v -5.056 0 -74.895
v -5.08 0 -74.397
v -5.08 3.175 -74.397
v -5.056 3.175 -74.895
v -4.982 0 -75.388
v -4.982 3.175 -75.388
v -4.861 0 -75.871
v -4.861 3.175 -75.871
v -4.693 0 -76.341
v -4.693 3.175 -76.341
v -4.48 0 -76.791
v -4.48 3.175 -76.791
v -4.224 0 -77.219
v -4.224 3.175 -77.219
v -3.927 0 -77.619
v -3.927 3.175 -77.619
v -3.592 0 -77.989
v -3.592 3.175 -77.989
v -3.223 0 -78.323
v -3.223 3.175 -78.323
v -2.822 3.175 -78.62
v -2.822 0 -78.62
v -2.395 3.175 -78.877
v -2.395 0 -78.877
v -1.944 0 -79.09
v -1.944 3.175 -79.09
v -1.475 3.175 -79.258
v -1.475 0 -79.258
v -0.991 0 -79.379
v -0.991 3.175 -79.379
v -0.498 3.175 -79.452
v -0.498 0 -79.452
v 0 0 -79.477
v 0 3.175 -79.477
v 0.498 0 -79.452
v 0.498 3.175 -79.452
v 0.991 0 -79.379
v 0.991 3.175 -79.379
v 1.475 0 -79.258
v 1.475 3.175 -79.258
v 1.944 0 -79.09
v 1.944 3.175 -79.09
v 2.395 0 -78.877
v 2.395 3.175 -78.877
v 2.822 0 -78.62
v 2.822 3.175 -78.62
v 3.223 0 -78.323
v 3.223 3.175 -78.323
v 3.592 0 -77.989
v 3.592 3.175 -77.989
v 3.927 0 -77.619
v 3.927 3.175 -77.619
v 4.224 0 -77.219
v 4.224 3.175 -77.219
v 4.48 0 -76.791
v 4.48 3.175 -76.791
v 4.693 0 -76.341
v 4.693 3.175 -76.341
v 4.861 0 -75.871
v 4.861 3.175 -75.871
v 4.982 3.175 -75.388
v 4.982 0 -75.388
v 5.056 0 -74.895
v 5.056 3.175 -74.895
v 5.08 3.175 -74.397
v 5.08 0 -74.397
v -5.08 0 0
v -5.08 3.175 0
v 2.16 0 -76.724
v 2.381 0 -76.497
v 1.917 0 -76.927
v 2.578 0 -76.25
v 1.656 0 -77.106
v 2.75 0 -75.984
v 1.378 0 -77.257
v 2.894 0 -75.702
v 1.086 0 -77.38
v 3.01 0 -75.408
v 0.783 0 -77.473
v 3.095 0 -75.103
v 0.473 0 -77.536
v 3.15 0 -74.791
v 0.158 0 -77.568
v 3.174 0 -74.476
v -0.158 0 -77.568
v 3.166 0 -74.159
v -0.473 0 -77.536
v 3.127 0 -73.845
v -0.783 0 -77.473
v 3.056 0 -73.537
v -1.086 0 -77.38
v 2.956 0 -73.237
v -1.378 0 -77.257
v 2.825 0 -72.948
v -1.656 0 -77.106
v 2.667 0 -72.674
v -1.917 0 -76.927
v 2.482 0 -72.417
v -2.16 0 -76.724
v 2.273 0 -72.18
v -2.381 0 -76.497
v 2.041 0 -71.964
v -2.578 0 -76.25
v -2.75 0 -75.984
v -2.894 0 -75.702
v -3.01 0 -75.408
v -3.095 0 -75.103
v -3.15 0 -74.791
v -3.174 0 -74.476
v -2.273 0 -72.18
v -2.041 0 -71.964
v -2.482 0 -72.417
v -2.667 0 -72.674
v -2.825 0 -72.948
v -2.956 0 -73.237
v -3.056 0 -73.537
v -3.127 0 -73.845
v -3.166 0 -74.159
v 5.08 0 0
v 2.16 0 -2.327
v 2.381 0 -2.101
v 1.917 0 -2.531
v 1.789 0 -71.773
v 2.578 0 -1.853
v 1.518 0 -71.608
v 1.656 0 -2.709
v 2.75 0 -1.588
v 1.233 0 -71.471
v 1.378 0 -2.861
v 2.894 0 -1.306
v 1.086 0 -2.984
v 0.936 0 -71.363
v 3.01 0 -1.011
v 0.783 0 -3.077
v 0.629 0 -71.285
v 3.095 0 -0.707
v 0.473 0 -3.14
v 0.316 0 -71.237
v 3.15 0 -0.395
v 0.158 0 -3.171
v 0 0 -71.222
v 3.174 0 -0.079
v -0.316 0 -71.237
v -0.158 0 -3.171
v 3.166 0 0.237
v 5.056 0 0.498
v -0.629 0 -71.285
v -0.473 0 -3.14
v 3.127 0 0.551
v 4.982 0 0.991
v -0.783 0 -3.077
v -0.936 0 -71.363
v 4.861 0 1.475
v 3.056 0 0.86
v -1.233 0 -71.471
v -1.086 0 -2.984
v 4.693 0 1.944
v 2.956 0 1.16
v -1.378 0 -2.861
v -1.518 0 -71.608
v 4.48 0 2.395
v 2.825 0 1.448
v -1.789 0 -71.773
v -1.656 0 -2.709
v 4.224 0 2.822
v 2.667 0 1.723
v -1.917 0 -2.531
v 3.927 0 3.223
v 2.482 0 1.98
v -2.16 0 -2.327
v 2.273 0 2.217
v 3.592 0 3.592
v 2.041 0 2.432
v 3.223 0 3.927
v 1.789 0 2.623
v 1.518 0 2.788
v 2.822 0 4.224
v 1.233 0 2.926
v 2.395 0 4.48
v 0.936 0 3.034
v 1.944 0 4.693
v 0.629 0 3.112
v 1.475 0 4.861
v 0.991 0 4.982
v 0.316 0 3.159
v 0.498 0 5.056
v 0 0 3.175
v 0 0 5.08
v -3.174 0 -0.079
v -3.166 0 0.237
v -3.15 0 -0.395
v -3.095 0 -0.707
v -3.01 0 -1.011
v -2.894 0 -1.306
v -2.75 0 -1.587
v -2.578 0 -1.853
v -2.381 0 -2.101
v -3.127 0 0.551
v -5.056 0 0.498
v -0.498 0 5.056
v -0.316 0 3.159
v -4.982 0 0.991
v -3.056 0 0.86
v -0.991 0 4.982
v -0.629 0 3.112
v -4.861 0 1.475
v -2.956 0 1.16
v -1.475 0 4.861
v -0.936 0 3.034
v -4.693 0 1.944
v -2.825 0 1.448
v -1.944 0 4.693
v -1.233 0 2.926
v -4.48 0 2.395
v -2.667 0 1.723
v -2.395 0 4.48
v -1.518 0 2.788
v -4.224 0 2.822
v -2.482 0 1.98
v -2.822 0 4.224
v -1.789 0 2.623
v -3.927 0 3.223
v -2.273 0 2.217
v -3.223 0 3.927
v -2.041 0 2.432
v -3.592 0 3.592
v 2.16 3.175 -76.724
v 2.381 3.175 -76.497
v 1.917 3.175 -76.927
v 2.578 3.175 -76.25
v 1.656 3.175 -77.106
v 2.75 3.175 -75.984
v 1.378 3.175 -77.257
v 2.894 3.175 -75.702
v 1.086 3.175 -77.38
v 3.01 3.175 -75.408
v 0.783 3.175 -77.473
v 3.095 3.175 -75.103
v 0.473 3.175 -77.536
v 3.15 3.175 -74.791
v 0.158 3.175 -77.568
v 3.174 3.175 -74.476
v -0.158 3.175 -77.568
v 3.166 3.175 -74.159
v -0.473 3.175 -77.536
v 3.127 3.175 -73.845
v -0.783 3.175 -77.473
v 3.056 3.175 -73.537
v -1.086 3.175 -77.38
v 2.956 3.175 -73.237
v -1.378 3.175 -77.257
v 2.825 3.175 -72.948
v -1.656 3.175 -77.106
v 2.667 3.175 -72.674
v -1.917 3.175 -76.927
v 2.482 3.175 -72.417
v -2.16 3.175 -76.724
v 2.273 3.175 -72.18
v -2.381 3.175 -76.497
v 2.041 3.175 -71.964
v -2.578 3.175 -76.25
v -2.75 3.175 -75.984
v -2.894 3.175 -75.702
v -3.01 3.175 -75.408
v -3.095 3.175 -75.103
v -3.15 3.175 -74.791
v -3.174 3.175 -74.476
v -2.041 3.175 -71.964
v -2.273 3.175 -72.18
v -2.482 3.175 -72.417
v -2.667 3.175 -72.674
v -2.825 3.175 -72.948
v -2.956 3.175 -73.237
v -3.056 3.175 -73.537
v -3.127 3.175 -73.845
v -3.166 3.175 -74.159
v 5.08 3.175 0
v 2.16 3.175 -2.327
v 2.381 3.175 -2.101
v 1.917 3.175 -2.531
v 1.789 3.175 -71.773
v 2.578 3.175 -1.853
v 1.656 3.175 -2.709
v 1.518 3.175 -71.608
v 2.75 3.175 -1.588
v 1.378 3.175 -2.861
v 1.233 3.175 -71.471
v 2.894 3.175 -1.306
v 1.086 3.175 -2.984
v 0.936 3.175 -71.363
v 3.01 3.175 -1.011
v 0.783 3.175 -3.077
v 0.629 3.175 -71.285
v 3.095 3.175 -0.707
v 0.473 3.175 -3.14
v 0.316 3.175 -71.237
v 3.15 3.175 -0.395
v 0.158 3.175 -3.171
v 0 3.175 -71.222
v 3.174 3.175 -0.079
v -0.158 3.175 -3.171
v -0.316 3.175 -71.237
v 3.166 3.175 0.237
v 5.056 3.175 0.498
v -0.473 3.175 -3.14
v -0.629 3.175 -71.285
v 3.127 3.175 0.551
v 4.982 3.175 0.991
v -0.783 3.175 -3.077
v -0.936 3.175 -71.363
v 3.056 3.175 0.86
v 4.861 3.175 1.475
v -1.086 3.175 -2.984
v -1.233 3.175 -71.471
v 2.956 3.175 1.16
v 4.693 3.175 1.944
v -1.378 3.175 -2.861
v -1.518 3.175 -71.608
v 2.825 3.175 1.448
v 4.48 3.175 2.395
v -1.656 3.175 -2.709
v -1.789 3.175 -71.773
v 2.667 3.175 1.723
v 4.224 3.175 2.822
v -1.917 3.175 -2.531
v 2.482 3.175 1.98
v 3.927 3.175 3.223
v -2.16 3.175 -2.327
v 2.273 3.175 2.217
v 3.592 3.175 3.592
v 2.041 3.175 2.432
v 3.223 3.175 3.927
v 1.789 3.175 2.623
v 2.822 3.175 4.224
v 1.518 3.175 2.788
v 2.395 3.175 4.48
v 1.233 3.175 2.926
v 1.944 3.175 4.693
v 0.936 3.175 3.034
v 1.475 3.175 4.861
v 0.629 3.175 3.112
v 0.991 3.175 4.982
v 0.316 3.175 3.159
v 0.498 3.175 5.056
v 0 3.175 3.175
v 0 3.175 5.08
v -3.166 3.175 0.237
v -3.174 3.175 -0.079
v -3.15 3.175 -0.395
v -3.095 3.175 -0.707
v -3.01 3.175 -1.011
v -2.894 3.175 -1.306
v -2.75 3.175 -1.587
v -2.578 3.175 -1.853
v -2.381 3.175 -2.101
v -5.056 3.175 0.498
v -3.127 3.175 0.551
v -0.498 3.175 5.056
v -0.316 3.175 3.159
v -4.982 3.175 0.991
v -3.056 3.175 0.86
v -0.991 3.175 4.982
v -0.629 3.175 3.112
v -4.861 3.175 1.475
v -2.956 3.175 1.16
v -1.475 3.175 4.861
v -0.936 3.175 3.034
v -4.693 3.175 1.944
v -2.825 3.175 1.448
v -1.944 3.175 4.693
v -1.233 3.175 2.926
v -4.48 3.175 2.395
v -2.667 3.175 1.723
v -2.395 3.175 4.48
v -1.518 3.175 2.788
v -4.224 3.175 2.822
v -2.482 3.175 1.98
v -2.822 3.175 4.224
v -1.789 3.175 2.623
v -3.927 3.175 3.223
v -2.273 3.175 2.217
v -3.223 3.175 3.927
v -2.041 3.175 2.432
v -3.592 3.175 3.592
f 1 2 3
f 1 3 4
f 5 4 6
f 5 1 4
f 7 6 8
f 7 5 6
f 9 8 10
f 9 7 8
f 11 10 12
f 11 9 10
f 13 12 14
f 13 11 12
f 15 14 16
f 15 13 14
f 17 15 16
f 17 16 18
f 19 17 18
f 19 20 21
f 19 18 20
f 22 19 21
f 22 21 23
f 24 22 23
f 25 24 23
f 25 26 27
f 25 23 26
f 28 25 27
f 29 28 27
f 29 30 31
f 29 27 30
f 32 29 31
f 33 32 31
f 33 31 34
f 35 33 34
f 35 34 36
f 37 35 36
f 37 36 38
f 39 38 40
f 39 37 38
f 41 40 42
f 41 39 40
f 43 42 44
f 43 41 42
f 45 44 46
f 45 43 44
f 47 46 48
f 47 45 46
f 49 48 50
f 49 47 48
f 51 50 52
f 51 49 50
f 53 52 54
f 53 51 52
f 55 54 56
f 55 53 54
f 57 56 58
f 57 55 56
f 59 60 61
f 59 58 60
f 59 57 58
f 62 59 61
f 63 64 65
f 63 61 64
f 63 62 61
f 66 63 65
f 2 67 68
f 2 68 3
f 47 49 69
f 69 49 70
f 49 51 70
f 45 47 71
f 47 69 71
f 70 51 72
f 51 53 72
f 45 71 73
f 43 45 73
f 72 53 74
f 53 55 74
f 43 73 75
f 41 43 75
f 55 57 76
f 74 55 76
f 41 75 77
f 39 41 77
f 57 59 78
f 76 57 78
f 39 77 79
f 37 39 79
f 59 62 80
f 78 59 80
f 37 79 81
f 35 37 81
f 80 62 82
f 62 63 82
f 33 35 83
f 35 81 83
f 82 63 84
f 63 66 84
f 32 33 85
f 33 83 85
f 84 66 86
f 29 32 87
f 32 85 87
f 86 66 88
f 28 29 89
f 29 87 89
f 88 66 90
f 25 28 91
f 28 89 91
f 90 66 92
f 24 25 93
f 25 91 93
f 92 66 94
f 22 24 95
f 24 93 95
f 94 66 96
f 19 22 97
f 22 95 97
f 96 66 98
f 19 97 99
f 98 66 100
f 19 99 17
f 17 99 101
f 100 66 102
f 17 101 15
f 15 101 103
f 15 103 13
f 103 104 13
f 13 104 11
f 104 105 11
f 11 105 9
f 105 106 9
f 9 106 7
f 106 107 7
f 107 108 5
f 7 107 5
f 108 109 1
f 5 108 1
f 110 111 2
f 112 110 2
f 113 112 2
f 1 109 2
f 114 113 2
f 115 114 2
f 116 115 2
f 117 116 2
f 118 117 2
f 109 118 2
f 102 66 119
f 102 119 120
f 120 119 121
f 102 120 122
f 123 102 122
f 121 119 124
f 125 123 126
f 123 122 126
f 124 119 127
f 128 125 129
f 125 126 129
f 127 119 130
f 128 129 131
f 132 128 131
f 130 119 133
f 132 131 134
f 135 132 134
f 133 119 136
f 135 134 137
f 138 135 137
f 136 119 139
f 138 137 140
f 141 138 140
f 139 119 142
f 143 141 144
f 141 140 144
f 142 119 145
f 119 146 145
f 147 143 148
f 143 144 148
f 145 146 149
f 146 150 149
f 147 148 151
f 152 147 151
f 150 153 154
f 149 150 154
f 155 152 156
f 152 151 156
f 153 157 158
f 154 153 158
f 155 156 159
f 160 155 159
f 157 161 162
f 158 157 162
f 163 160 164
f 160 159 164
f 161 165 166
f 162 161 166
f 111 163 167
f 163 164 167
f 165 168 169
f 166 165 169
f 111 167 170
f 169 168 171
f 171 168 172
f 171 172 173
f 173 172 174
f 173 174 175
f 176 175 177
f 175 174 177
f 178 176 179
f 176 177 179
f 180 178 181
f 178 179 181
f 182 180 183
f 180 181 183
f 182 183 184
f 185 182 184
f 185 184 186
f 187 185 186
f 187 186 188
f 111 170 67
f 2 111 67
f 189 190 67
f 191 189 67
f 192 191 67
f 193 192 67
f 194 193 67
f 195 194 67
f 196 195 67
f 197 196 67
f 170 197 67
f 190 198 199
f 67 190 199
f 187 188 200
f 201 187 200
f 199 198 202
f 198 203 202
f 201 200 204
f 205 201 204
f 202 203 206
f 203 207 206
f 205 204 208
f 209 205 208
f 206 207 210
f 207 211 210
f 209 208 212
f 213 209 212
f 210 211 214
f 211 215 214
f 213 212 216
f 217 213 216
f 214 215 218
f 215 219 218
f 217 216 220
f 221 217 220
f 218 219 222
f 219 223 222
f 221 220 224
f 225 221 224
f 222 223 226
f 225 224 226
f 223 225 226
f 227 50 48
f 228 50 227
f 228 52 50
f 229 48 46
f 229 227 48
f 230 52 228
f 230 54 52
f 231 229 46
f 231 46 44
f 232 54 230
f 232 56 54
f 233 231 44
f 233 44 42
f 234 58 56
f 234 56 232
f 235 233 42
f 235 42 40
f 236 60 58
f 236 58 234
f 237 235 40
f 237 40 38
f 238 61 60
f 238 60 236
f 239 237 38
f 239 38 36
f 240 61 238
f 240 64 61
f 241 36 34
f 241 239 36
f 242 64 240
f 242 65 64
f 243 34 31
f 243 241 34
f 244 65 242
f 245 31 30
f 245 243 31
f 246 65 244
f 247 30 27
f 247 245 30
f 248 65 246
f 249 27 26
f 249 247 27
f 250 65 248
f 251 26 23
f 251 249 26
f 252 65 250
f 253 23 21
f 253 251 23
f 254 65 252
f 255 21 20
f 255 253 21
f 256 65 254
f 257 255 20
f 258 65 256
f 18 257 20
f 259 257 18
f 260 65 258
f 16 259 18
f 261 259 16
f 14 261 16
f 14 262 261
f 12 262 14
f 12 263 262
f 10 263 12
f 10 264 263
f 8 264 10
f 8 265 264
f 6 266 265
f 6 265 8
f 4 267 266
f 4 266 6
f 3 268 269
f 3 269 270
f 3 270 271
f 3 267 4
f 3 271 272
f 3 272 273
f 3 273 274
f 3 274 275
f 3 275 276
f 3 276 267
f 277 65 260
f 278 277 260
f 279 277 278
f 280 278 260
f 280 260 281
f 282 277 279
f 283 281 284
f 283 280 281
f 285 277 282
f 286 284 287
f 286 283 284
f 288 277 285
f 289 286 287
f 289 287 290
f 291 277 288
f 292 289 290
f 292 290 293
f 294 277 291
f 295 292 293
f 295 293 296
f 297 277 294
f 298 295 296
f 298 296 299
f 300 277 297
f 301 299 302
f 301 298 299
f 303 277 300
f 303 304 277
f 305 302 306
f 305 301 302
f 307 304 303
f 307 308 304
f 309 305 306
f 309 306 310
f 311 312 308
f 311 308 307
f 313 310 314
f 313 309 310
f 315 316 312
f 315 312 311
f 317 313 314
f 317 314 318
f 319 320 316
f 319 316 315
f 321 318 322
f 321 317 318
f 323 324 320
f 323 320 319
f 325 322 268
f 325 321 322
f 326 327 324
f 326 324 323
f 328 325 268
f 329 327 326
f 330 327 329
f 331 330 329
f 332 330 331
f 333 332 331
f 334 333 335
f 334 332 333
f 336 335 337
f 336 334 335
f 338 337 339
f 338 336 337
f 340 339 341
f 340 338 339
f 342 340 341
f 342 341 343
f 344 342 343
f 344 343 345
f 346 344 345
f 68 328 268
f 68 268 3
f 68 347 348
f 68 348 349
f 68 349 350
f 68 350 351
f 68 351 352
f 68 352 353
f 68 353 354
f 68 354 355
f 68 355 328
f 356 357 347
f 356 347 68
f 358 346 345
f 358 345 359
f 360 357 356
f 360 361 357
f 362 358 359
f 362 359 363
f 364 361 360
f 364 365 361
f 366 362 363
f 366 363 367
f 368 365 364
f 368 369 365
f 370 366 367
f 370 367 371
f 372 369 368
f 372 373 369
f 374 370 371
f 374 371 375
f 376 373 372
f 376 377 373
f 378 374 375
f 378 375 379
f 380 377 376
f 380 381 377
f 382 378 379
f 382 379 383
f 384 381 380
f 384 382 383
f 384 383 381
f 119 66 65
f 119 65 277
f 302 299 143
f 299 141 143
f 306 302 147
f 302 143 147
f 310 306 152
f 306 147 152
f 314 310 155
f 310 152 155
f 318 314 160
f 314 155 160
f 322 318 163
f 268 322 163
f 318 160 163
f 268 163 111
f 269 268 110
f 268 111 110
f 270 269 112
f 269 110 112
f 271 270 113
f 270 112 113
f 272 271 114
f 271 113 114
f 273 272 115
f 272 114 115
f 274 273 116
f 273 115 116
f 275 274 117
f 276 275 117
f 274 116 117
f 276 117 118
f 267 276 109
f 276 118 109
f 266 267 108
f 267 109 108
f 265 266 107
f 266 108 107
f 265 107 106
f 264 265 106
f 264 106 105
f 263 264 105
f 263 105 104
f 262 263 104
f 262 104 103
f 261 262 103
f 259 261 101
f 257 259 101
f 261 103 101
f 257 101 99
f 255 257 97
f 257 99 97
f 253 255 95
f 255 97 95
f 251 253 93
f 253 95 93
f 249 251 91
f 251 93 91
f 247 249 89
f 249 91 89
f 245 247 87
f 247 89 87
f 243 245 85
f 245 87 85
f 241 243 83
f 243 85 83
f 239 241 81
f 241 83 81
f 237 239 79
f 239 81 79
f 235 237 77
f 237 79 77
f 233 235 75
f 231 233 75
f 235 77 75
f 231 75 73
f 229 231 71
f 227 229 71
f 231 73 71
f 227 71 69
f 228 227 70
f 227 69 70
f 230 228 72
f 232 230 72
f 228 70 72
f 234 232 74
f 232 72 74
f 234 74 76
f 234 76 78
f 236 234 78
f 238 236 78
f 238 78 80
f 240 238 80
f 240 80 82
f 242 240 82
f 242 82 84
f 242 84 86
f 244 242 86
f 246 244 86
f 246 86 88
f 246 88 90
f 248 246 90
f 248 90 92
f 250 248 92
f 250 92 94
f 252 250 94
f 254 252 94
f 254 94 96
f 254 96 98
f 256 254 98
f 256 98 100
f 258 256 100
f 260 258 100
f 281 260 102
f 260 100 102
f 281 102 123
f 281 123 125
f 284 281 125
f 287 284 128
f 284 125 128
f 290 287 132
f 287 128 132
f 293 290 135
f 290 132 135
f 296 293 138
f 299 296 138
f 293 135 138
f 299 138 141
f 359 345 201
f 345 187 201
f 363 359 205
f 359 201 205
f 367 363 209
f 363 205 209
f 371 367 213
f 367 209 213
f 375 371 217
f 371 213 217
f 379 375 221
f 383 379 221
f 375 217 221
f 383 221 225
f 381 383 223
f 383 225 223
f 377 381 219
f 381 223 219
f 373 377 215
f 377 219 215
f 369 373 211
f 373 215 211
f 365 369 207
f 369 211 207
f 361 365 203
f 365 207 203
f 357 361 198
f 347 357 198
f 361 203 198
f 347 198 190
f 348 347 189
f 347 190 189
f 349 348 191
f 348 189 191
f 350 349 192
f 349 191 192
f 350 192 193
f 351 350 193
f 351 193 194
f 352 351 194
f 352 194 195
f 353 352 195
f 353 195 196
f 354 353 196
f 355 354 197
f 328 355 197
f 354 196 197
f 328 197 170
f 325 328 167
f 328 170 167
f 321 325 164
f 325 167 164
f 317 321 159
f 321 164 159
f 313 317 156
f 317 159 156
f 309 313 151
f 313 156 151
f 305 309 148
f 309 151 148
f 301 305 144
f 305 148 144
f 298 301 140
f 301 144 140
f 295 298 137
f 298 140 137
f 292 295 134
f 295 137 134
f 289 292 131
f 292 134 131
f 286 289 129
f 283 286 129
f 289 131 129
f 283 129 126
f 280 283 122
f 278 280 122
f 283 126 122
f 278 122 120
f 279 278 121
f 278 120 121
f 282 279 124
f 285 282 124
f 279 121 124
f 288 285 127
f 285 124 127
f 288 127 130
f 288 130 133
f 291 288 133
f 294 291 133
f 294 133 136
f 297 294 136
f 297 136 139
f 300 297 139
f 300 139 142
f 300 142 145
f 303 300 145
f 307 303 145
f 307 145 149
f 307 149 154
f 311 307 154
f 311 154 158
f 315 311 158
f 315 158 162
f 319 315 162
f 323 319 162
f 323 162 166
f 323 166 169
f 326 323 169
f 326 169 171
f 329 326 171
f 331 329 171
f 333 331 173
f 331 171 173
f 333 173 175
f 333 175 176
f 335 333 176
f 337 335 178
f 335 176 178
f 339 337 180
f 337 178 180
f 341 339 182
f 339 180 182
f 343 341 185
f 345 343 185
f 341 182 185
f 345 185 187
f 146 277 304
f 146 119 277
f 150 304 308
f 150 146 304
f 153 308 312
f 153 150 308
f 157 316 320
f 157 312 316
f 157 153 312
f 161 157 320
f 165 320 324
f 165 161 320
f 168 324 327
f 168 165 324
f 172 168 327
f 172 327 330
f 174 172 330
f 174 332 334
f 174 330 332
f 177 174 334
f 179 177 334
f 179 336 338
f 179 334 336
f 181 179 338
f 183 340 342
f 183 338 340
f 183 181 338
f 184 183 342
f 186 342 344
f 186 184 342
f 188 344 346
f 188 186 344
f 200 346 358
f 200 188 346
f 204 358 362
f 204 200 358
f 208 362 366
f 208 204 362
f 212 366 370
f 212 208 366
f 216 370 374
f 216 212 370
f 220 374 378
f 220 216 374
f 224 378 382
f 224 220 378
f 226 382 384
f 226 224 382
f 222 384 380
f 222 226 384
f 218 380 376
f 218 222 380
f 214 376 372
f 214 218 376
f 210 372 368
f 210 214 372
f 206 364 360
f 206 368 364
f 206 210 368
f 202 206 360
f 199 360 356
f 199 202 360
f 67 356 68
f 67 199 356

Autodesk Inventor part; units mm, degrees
ref_plane "YZ Plane" through (0, 0, 0) normal (1, 0, 0) x (0, 1, 0)
ref_plane "XZ Plane" through (0, 0, 0) normal (0, 1, 0) x (-1, 0, 0)
ref_plane "XY Plane" through (0, 0, 0) normal (0, 0, 1) x (1, 0, 0)
sketch "Sketch1" plane through (0, 0, 0) normal (0, 1, 0) x (-1, 0, 0)
  line L0 (0, 0) -> (0, -74.3966) construction
  circle A0 centre (0, 0) radius 5.08
  circle A1 centre (0, -74.3966) radius 5.08
  line L1 (5.08, 0) -> (5.08, -74.3966)
  line L2 (-5.08, -74.3966) -> (-5.08, 0)
  dimension "d0" = 74.3966
  dimension "d1" = 10.16
  dimension "d2" = 10.16
extrude "Extrusion1" add sketch "Sketch1" along normal blind 3.175
sketch "Sketch2" plane through (0, 3.175, 0) normal (0, 1, 0) x (1, 0, 0)
  arc A0 (5.08, 74.3966) -> (-5.08, 74.3966) centre (0, 74.3966) ccw projected
  point P0 (0, 0)
  point P1 (0, 0)
hole "Hole1" at (0, 3.175, 0) at (0, 3.175, -74.3966) direction (0, -1, 0) diameter 6.35 depth 25.4 tip angle 118
properties part number "linkage"
